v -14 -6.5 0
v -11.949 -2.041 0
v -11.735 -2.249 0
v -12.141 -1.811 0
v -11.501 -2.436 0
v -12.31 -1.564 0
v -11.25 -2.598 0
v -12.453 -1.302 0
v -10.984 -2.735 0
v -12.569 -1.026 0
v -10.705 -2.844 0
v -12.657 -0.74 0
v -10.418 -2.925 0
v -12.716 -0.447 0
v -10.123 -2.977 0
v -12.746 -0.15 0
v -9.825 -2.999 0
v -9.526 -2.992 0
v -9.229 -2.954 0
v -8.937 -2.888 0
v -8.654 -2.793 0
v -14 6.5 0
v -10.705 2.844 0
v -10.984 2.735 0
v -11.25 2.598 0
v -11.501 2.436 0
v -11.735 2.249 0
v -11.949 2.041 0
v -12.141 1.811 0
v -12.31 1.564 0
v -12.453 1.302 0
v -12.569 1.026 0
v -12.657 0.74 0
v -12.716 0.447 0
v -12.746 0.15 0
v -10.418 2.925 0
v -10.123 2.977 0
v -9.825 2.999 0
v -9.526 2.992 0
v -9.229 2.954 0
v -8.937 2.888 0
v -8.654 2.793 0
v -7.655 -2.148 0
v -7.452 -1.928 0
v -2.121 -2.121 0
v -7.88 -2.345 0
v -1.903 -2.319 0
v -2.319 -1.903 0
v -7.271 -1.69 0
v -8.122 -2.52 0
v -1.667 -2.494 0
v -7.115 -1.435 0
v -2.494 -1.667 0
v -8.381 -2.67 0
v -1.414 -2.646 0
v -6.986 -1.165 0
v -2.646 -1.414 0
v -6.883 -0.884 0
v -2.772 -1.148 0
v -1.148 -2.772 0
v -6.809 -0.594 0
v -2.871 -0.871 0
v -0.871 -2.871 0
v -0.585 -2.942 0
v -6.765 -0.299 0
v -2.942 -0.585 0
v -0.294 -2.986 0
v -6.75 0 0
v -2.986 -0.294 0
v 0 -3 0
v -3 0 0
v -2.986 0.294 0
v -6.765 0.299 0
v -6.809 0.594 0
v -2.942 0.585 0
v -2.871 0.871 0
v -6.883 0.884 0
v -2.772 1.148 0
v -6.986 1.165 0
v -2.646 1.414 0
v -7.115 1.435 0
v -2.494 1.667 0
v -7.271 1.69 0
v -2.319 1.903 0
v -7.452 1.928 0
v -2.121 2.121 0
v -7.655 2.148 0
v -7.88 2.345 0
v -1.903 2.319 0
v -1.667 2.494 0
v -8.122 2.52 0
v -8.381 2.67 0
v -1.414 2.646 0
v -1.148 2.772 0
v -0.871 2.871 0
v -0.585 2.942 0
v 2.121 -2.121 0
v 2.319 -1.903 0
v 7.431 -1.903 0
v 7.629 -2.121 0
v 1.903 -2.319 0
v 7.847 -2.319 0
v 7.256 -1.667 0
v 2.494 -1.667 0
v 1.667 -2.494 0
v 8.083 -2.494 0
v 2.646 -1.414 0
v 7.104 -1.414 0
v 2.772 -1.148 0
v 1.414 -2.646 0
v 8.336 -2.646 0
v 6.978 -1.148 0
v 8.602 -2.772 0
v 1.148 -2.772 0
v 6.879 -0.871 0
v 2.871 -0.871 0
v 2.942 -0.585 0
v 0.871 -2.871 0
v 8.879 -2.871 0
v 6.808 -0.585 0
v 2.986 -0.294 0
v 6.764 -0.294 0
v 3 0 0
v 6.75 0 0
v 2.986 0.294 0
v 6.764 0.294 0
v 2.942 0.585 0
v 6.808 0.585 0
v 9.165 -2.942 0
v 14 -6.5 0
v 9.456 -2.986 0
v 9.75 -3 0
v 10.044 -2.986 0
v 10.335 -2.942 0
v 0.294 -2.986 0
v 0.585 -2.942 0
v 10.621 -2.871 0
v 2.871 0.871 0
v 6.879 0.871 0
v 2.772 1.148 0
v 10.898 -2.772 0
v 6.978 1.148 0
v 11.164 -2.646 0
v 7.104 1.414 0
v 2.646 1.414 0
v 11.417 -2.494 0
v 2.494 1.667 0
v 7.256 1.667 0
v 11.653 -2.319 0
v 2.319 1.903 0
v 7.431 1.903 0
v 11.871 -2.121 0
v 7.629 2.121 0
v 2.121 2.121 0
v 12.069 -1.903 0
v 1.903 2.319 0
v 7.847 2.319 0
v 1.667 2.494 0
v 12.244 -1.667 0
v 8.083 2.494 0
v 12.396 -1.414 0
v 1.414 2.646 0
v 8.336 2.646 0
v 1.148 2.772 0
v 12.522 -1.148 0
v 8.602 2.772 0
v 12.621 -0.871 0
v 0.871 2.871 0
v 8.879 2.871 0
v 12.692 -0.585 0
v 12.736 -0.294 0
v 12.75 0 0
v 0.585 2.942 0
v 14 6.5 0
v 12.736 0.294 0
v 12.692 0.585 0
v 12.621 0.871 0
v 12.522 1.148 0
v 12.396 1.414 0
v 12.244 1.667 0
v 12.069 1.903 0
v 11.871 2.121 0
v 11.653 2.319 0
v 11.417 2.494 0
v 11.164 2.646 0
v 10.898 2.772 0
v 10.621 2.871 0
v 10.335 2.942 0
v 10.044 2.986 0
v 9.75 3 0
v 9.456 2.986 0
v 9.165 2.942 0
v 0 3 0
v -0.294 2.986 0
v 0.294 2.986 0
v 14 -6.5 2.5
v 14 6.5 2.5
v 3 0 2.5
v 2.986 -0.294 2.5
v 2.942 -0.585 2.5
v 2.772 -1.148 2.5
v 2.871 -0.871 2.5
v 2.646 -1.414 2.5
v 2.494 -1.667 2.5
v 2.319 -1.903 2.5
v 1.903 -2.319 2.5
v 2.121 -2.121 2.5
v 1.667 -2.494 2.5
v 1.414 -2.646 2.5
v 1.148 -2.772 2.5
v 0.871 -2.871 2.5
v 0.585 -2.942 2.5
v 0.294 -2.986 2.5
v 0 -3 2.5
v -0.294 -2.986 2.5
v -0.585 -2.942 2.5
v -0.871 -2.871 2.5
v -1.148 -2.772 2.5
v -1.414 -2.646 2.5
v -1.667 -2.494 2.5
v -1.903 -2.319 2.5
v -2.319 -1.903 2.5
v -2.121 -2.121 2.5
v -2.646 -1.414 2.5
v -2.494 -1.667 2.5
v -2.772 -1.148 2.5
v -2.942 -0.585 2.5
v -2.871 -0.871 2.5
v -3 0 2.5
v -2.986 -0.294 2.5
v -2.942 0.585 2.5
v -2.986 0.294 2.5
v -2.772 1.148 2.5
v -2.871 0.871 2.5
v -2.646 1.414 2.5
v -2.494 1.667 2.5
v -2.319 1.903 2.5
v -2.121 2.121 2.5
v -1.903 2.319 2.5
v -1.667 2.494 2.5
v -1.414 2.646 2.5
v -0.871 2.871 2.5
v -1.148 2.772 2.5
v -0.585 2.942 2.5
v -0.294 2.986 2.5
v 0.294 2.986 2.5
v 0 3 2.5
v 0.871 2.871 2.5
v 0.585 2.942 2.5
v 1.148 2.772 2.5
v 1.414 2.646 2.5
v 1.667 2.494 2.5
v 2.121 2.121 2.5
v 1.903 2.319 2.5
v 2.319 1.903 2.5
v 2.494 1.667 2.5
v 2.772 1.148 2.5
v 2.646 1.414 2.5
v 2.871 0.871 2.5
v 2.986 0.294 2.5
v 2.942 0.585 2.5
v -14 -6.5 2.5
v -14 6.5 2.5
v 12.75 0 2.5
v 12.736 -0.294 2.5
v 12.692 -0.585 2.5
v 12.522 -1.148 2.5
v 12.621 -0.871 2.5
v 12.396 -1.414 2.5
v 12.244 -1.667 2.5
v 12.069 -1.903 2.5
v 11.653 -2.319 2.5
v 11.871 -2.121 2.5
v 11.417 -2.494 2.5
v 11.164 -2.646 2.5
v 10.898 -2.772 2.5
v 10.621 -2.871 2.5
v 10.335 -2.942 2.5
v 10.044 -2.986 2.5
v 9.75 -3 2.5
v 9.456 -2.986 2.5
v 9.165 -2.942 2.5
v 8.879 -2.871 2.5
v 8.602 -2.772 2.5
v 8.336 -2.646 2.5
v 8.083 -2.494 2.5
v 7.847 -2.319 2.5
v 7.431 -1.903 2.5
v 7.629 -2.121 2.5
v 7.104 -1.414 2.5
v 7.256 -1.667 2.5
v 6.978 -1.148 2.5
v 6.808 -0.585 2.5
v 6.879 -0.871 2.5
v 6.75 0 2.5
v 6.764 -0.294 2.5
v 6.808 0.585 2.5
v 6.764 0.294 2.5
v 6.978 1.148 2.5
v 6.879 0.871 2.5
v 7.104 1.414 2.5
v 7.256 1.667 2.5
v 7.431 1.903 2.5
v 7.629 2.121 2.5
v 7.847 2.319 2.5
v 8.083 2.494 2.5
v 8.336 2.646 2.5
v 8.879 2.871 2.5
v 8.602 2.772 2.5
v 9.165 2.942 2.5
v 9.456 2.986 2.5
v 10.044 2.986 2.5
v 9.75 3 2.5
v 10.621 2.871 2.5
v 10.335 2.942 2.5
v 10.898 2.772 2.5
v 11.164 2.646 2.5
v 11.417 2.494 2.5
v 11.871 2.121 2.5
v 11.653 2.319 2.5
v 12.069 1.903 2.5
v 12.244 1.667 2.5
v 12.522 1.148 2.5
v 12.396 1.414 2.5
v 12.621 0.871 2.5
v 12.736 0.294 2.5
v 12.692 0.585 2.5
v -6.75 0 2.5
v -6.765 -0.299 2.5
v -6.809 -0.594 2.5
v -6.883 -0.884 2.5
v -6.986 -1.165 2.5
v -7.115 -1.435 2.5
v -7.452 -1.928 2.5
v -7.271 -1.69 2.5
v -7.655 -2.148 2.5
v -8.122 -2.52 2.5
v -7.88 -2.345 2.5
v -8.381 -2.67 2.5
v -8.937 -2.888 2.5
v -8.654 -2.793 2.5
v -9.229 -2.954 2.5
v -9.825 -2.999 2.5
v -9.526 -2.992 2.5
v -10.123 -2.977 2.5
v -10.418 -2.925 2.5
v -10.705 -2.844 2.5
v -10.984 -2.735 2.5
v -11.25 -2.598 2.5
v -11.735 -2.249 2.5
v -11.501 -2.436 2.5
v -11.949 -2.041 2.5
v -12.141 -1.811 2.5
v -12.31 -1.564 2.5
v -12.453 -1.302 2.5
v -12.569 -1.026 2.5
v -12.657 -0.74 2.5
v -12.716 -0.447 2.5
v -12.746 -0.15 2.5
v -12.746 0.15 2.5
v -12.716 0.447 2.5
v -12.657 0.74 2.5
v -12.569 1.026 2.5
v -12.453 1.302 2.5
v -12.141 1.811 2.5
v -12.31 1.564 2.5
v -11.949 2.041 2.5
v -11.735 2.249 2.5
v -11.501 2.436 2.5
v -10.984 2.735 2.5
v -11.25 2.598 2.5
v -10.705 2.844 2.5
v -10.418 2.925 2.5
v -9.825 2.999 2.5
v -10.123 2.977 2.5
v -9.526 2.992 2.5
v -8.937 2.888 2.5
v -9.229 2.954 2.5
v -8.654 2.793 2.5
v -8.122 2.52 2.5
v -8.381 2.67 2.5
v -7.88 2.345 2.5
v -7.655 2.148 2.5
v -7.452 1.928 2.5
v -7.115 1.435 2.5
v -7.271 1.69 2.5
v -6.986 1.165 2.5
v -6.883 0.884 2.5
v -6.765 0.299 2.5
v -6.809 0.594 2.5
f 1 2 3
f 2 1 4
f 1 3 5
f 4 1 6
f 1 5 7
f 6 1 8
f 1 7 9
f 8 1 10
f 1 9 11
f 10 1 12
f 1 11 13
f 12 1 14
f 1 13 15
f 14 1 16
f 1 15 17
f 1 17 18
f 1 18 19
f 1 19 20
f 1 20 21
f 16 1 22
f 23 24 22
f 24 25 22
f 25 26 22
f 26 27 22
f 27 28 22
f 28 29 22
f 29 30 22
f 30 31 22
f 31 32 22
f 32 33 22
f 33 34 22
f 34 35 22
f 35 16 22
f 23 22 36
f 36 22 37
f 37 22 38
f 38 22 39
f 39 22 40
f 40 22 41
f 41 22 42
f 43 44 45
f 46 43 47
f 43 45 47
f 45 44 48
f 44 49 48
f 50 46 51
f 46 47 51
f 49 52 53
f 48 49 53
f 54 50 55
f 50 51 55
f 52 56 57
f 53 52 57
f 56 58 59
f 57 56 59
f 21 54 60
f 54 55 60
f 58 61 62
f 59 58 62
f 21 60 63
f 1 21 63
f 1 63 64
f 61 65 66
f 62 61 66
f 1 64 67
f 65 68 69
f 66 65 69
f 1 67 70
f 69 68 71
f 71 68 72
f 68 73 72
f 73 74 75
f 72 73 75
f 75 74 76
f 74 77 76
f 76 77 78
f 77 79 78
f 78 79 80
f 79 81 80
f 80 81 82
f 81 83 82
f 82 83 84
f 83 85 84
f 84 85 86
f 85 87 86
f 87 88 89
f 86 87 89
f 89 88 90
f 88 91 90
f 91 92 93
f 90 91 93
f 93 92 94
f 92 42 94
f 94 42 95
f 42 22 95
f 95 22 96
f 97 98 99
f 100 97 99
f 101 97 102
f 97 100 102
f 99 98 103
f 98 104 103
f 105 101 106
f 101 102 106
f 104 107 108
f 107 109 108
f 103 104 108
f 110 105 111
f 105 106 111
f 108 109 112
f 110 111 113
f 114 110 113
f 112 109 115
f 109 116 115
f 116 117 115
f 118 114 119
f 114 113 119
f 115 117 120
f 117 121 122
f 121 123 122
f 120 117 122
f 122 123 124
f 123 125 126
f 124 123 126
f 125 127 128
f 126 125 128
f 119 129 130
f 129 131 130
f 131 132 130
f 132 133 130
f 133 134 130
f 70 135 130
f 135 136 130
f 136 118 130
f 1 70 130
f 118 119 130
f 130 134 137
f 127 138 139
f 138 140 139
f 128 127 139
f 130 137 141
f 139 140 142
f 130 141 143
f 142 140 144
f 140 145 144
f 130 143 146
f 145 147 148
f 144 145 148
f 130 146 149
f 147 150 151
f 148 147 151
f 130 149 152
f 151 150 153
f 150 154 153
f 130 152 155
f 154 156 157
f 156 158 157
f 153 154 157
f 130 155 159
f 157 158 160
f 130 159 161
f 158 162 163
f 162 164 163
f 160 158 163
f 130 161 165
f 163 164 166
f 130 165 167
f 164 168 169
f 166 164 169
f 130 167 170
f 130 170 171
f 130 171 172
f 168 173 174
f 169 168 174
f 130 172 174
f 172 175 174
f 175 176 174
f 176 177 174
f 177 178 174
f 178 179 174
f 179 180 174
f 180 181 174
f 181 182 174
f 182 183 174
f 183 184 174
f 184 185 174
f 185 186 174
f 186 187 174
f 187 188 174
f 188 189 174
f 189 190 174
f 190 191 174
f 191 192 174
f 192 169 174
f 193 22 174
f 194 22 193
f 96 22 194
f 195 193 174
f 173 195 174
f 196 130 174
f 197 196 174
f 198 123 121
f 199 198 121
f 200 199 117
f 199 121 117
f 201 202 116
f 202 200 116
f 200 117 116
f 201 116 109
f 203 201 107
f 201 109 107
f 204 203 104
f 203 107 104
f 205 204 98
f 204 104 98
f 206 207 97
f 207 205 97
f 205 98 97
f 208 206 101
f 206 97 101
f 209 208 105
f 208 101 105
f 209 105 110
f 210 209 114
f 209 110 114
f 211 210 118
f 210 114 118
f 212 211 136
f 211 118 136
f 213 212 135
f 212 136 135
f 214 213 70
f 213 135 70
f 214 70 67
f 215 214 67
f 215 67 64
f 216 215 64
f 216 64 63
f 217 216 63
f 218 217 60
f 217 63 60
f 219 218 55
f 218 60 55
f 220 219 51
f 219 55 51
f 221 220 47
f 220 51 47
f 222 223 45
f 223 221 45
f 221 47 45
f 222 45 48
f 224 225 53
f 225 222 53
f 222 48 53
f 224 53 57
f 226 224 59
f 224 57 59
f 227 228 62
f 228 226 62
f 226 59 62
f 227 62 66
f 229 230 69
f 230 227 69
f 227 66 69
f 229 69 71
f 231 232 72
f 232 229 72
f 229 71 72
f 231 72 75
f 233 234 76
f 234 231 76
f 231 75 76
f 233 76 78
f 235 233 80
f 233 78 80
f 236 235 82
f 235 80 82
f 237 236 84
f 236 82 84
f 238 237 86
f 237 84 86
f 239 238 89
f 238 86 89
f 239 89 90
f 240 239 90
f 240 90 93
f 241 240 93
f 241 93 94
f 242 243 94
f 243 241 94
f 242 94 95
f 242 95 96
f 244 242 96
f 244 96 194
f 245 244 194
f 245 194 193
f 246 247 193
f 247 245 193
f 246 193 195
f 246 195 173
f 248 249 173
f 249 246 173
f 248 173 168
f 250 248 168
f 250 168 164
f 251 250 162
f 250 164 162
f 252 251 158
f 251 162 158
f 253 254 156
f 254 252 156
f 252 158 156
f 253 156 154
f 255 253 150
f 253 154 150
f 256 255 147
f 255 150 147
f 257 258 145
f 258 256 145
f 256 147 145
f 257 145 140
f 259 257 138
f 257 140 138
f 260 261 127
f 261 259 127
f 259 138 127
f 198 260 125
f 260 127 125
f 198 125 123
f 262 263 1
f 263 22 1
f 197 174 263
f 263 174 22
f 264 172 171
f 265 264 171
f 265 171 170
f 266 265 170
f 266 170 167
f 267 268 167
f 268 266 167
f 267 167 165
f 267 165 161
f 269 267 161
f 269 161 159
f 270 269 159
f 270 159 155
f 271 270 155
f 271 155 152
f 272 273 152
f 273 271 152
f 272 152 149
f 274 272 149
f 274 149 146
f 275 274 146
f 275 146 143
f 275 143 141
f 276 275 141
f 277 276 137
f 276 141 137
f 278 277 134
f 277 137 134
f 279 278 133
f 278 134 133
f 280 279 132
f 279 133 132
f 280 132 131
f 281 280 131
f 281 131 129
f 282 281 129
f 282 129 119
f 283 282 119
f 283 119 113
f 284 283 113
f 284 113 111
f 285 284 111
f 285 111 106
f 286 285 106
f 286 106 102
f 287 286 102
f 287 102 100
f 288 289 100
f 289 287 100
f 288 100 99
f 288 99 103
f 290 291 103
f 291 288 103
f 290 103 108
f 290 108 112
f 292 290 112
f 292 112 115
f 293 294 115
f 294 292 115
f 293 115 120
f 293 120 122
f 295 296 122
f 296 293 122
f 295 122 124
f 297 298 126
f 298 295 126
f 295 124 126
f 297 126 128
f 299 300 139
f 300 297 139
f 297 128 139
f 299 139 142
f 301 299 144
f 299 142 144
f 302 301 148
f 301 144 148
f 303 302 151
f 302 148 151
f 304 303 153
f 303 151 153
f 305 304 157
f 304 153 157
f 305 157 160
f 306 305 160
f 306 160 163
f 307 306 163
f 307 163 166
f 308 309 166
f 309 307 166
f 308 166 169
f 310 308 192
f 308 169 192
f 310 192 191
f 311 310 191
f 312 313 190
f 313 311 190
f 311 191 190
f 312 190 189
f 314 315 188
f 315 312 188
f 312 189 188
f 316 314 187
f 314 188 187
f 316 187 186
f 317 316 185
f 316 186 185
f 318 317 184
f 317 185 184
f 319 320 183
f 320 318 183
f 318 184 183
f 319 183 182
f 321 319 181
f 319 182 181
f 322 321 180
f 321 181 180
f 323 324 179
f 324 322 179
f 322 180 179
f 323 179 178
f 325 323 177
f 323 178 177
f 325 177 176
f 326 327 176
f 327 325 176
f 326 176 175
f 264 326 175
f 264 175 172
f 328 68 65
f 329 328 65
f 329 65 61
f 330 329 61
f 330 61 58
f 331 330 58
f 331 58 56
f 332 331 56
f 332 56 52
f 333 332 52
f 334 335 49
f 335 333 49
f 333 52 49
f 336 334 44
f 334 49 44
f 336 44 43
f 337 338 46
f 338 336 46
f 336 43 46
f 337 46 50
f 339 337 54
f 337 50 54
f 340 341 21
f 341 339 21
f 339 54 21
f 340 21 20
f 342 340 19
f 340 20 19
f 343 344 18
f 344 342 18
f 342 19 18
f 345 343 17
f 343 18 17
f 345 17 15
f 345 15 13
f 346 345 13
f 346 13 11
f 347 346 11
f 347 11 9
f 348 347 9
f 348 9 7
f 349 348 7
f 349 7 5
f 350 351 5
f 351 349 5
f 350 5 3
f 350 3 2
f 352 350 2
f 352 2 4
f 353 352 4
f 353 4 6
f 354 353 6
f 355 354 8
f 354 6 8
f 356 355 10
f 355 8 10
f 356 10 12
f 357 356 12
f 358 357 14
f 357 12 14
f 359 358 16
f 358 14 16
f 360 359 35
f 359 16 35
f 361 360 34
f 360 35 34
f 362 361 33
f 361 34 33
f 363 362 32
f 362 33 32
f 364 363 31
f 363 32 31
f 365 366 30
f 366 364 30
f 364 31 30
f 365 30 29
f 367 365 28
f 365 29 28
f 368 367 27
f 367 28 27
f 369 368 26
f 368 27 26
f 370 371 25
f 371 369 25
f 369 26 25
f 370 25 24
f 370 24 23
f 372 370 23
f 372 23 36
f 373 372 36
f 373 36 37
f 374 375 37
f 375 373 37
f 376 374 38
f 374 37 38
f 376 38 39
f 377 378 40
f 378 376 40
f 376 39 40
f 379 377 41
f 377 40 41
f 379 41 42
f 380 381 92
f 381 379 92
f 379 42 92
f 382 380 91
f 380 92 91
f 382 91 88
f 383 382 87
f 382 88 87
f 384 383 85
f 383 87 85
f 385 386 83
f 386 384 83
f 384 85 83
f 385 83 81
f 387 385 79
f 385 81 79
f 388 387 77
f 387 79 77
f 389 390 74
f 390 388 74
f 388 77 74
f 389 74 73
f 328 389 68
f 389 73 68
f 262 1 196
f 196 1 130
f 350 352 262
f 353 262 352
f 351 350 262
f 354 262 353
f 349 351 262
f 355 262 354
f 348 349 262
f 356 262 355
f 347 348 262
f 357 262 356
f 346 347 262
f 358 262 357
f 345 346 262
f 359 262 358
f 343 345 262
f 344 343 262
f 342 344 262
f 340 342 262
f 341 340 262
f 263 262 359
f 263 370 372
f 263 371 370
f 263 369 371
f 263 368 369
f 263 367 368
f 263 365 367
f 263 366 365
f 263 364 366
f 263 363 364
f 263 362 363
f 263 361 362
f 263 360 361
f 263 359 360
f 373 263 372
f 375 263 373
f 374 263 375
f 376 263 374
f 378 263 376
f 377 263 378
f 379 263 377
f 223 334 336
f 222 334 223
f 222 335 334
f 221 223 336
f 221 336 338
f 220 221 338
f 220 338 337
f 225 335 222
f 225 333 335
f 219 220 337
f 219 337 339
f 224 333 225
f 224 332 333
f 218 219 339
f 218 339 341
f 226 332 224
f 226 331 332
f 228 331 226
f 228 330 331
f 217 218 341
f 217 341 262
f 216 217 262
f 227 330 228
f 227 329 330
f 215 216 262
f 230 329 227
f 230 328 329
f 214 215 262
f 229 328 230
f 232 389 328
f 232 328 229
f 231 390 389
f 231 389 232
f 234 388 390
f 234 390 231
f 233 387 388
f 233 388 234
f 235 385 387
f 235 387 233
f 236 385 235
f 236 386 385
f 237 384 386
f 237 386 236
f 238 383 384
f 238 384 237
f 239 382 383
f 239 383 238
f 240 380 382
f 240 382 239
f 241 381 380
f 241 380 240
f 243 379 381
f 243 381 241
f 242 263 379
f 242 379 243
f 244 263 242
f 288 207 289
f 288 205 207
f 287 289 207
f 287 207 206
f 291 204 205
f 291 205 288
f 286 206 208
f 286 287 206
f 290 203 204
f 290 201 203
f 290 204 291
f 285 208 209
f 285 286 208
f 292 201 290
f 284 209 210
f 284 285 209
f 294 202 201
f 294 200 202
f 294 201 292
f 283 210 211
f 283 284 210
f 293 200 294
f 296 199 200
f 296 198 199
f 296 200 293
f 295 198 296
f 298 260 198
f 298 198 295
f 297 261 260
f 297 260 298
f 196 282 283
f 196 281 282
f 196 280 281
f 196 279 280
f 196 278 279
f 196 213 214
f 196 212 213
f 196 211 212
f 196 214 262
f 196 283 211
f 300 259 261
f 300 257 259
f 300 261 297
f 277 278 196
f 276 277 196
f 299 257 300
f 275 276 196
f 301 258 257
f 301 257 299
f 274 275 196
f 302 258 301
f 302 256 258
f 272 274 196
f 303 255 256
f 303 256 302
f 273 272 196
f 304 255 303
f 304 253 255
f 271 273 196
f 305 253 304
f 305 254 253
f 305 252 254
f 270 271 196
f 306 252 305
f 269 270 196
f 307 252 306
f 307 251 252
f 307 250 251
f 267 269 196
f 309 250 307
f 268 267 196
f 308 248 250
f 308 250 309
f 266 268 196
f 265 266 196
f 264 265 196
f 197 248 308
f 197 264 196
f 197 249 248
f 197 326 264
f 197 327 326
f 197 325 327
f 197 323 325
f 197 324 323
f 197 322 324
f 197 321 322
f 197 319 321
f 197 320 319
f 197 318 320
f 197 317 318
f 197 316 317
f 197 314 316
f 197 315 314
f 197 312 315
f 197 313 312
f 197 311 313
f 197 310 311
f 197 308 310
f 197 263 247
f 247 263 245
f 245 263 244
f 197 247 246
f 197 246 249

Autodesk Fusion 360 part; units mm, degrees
sketch "Sketch1" plane through (0, 0, 0) normal (0, 0, 1) x (1, 0, 0) in component "Component"
  line L0 (-13, 0) -> (-13, 6.5)
  line L1 (-13, 0) -> (-13, -6.5)
  line L2 (-13, -6.5) -> (13, -6.5)
  line L3 (13, -6.5) -> (13, 6.5)
  line L4 (13, 6.5) -> (-13, 6.5)
  circle A0 centre (0, 0) radius 3
  line L5 (0, 0) -> (9.75, 0)
  line L6 (0, 0) -> (-9.75, 0)
  circle A1 centre (-9.75, 0) radius 3
  circle A2 centre (9.75, 0) radius 3
  line L7 (13, -6.5) -> (14, -6.5)
  line L8 (14, -6.5) -> (14, 6.5)
  line L9 (14, 6.5) -> (13, 6.5)
  line L10 (-13, 6.5) -> (-14, 6.5)
  line L11 (-14, 6.5) -> (-14, -6.5)
  line L12 (-14, -6.5) -> (-13, -6.5)
  dimension "d2" = 13
  dimension "d3" = 6.5
  dimension "d4" = 6.5
  dimension "d5" = 13
  dimension "d6" = 9.75
  dimension "d7" = 9.75
  dimension "d8" = 6
  dimension "d9" = 6
  dimension "d10" = 13
  dimension "d11" = 13
extrude "Extrude1" add sketch "Sketch1" along normal blind 2.5 in component "Component"
component "Component" placed x (1, 0, 0) y (0, 1, 0) z (0, 0, 1) at (0, 0, 0)
